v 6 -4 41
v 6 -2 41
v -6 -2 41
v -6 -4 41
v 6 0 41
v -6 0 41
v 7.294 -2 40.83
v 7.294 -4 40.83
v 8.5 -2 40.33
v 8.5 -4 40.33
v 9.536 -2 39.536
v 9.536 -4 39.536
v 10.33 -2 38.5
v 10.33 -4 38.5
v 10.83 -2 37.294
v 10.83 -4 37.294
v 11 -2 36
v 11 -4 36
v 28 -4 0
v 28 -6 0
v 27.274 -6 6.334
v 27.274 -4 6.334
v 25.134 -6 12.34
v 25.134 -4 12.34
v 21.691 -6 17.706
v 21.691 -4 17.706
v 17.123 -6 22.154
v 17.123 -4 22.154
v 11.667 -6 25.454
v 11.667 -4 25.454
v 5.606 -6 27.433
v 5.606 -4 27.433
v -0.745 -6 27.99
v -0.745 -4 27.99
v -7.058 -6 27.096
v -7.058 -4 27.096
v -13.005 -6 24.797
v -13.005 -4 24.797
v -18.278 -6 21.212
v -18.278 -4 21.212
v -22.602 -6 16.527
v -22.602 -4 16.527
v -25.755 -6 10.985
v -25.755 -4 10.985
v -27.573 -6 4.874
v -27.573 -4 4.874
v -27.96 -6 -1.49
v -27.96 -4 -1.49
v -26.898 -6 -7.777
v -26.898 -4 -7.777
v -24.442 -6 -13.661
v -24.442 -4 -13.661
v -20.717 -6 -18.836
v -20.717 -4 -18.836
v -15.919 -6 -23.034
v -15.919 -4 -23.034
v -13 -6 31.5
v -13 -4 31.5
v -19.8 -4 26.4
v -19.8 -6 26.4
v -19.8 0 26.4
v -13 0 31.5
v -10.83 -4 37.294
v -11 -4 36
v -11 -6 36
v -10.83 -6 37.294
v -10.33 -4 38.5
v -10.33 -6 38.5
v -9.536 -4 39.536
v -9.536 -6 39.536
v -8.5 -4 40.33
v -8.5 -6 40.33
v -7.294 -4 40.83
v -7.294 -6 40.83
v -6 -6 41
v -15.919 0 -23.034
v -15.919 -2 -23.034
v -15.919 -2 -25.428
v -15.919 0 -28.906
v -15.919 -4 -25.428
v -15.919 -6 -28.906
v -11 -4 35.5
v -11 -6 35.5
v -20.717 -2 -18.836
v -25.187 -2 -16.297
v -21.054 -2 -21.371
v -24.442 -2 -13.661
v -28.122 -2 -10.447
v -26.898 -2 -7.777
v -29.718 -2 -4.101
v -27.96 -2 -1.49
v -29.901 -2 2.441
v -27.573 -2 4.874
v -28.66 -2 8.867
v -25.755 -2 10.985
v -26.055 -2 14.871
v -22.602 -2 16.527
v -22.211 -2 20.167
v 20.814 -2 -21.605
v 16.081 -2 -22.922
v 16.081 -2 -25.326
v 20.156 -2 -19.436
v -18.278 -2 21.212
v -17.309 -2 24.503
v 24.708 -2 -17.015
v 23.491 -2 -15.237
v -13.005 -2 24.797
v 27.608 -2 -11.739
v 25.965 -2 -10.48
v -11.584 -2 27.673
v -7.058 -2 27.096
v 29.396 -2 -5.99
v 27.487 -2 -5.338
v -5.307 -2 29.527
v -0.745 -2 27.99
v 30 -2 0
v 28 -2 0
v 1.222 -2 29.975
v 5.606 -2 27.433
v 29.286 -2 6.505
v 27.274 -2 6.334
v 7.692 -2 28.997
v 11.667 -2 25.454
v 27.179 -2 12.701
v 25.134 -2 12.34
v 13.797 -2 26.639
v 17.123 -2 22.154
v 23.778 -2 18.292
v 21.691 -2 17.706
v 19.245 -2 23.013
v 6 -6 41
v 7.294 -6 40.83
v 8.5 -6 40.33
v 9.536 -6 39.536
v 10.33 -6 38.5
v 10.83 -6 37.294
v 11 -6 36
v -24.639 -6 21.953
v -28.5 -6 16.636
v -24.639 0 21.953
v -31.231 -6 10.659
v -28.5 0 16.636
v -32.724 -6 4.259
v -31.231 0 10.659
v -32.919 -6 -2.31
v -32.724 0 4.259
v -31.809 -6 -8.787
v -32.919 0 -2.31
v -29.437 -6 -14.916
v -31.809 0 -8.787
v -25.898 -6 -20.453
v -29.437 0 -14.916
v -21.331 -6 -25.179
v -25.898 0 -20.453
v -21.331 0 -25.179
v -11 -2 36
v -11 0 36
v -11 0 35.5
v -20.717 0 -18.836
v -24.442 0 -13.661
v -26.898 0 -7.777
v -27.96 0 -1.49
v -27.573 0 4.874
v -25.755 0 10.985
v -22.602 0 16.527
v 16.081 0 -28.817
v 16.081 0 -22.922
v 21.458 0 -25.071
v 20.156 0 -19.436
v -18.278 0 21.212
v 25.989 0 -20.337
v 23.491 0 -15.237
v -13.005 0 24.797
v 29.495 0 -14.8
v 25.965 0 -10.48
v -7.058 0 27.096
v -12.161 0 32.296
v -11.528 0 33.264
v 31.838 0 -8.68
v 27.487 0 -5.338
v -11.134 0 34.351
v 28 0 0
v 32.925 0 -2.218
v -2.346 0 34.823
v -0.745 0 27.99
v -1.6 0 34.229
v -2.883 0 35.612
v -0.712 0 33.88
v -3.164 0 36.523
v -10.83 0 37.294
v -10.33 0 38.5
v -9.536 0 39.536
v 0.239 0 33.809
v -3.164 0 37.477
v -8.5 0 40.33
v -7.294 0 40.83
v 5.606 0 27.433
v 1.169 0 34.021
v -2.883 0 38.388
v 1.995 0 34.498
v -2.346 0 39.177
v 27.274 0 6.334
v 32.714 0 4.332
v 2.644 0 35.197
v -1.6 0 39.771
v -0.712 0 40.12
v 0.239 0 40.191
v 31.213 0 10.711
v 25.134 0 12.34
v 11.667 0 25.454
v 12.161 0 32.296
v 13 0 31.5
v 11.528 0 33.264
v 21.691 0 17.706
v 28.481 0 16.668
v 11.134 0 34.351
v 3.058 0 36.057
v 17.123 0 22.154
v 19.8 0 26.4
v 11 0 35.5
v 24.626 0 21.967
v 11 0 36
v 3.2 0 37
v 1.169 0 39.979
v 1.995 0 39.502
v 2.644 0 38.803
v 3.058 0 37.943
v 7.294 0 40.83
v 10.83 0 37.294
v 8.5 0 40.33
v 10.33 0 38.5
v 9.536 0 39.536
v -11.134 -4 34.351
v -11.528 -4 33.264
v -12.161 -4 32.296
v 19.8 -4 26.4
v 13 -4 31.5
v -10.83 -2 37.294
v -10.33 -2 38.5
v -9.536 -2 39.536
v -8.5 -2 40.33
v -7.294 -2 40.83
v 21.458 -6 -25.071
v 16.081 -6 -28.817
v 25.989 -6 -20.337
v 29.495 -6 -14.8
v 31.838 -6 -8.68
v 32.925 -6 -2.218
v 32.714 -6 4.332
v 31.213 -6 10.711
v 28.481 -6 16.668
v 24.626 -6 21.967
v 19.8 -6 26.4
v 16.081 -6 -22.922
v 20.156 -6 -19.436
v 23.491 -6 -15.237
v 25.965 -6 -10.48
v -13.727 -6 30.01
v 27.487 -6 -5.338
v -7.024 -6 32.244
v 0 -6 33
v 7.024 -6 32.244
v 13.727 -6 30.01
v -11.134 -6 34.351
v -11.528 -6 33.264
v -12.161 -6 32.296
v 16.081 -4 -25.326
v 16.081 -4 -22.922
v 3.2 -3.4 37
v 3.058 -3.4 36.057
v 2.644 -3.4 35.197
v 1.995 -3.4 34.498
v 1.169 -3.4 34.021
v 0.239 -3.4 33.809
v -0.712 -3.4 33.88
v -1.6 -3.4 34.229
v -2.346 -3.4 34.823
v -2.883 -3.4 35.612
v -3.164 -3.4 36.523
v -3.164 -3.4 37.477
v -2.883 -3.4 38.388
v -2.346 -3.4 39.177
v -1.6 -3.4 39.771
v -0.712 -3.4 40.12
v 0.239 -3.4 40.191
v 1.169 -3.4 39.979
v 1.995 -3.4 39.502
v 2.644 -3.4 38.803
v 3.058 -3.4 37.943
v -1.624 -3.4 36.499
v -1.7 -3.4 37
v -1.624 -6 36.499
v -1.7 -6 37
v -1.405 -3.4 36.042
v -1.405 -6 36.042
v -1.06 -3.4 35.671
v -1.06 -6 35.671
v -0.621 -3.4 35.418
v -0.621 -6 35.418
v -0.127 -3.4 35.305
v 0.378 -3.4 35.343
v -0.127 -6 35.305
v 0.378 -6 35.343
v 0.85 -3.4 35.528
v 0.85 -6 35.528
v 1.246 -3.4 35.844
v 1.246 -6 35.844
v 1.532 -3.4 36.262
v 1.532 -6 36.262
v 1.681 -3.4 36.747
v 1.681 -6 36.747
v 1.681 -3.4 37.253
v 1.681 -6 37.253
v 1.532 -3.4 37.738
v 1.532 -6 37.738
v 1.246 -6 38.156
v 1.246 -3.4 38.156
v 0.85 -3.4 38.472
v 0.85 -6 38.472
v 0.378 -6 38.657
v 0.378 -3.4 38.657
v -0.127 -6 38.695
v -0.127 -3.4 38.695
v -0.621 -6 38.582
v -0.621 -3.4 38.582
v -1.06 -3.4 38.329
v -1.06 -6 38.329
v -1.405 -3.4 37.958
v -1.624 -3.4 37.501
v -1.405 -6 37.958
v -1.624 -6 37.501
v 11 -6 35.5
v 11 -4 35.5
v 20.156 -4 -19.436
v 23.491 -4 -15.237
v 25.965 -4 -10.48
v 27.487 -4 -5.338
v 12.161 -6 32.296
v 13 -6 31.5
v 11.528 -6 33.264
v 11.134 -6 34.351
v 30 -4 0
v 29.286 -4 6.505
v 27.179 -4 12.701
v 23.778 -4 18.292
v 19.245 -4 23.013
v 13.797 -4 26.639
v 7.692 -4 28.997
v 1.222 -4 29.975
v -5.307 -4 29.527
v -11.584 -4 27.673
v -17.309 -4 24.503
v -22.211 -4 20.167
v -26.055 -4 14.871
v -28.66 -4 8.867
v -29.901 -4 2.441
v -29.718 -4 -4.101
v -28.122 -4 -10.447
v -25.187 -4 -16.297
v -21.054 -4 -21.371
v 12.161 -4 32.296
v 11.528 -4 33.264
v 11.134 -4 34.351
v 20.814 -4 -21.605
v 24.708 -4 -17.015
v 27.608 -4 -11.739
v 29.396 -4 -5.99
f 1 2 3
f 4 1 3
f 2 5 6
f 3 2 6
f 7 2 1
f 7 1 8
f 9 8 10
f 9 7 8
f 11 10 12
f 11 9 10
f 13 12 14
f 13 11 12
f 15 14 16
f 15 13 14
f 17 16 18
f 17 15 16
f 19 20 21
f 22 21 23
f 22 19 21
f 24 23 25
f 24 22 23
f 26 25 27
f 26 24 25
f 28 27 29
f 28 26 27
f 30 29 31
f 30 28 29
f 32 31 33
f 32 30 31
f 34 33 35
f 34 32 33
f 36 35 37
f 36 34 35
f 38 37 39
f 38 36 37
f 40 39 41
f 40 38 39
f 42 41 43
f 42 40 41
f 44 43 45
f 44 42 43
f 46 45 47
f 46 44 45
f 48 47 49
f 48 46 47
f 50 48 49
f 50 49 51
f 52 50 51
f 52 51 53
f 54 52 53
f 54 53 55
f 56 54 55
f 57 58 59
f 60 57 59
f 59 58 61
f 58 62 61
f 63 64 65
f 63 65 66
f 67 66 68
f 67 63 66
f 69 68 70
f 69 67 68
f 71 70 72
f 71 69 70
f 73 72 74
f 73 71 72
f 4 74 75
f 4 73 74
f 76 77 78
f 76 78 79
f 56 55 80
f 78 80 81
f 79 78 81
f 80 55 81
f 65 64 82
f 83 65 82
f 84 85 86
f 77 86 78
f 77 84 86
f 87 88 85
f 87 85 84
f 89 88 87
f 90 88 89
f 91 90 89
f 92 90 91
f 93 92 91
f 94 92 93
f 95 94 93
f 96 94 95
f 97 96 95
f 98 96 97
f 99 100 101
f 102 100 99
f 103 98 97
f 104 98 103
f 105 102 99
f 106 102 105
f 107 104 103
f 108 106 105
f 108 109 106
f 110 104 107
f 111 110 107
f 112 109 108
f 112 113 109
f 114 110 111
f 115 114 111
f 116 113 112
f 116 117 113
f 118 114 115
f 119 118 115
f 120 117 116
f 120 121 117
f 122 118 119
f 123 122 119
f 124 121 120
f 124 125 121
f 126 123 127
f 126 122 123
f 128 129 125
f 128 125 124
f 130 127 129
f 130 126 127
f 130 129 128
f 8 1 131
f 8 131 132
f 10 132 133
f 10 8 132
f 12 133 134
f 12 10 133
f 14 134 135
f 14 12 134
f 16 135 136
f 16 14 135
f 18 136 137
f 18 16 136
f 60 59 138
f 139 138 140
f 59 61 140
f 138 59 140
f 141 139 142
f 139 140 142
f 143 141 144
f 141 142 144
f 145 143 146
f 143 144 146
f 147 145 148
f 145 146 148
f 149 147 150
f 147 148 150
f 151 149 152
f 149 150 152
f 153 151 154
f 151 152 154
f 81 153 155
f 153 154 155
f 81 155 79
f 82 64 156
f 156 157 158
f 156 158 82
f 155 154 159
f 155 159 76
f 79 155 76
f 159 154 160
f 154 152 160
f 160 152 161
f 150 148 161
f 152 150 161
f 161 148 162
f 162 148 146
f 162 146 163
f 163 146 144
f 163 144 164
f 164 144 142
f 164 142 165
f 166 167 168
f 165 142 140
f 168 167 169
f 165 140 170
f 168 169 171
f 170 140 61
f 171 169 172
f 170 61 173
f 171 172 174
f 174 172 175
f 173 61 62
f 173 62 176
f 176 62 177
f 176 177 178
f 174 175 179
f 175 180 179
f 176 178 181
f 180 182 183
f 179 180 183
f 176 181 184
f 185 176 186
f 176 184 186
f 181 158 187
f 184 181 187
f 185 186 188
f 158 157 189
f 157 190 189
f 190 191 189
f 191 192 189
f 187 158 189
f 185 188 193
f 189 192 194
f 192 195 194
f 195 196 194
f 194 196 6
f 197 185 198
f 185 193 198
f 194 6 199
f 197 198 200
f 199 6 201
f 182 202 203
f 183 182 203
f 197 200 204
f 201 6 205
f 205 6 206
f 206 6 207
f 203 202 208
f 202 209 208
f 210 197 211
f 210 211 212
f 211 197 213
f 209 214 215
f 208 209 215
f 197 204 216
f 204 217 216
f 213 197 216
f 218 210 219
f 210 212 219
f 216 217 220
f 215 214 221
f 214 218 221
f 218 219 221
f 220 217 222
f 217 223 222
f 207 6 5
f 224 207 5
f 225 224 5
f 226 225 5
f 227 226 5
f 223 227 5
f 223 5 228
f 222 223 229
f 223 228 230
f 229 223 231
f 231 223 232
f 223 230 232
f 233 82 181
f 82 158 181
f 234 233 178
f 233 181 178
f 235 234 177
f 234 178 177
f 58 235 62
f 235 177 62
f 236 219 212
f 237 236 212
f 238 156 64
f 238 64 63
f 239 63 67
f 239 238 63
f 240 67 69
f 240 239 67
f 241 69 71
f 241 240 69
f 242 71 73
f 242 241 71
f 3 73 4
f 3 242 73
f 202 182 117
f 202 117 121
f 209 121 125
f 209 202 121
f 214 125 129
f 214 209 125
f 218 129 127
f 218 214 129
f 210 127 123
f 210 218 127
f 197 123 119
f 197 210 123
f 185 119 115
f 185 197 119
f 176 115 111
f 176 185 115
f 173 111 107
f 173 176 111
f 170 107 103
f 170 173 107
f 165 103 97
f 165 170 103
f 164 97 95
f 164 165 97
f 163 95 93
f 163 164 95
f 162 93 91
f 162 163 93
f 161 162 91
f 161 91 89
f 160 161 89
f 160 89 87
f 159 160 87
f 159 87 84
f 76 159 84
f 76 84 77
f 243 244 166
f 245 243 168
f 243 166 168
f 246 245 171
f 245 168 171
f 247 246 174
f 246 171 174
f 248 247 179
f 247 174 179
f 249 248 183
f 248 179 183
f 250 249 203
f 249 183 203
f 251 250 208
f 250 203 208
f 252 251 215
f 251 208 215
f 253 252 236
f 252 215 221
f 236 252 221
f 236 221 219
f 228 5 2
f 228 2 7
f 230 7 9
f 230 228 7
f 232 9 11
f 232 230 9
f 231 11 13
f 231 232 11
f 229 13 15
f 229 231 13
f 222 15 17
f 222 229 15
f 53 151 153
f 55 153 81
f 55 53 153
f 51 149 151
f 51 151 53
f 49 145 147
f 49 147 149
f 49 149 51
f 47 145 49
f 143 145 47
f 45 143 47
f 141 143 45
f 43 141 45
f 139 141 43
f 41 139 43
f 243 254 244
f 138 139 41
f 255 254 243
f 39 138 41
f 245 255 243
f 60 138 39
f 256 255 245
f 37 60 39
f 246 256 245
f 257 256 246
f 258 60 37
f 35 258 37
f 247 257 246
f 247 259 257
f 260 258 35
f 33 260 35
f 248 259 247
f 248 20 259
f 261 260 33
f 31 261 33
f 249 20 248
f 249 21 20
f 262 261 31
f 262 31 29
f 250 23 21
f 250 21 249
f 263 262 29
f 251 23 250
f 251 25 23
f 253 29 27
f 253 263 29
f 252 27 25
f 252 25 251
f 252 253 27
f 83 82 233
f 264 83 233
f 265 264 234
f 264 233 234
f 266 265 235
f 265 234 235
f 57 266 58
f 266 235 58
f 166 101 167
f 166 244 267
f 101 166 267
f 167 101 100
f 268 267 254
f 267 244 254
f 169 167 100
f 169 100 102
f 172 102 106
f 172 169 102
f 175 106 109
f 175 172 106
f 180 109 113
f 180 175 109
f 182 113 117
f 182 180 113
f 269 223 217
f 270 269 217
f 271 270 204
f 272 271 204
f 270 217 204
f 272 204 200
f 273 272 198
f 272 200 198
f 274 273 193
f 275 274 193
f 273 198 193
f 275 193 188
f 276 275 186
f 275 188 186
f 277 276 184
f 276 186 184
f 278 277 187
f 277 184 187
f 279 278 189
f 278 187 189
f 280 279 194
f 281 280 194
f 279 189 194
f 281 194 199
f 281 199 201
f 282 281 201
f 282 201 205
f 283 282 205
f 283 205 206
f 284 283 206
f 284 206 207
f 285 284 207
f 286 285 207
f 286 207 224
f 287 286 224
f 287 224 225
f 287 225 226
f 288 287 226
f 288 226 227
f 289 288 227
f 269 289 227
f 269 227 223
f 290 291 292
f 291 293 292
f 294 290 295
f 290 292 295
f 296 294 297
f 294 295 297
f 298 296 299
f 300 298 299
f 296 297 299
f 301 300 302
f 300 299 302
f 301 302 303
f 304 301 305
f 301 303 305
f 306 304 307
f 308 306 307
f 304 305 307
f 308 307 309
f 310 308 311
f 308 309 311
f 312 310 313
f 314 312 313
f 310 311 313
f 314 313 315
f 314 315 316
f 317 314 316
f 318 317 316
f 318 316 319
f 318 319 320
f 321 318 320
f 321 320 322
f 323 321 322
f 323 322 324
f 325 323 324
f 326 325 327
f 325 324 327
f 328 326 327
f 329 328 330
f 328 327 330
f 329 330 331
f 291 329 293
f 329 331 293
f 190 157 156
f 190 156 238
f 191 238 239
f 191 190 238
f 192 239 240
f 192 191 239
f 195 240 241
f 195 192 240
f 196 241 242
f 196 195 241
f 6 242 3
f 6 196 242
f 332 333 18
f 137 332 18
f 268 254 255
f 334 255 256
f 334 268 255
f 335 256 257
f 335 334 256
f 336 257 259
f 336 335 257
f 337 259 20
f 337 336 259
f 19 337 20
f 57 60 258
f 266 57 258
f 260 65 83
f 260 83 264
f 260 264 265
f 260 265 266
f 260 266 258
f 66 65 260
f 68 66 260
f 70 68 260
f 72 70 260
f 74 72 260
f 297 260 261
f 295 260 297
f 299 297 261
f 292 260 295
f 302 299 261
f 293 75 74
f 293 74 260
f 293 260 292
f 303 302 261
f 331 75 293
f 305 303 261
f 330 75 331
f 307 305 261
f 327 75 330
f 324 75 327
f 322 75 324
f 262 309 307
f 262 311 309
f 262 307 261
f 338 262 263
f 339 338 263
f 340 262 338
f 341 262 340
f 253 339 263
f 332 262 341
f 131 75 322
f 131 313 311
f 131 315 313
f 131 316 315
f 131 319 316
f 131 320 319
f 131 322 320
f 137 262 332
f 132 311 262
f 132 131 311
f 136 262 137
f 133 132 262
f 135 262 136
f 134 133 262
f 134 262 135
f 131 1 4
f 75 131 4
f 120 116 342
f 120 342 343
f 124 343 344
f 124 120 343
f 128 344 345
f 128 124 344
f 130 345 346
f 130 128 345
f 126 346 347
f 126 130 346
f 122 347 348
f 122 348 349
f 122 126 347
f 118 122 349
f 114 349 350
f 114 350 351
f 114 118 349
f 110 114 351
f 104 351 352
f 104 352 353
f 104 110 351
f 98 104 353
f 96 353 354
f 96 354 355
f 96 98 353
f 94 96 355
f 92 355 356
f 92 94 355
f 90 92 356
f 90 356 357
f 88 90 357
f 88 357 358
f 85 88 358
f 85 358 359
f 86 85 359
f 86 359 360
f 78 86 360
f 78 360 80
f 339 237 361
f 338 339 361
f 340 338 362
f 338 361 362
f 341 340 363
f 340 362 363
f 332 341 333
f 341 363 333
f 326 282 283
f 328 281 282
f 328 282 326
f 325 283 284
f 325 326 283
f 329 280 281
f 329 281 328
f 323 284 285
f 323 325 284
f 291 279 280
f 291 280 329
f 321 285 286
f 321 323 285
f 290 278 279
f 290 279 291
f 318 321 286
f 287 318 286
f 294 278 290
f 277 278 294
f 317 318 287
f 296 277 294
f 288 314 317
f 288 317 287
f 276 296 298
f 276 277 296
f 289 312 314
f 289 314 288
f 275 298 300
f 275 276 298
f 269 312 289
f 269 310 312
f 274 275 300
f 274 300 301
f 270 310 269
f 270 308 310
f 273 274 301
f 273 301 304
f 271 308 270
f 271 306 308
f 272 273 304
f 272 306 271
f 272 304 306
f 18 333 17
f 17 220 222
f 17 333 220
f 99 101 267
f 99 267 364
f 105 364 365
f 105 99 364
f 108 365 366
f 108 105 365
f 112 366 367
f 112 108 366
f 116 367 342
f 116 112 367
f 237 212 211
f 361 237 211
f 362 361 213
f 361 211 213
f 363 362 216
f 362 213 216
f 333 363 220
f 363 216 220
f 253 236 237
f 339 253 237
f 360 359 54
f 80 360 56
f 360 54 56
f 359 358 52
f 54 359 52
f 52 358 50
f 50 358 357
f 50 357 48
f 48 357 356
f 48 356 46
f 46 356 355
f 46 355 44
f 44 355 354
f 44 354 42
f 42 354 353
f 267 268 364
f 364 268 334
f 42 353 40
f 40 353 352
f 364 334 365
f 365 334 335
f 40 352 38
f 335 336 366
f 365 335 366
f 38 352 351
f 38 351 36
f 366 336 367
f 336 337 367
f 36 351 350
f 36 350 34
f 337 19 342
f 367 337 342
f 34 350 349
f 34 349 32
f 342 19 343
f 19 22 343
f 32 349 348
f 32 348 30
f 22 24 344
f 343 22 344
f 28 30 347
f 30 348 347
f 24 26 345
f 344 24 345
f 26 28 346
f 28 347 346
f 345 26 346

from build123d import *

# Parameters (mm, degrees)
F0_R            = 28
F1_DEPTH        = 2
F2_R            = 30
F2_R_2          = 1.5
F3_DEPTH        = 2
F4_R            = 30
F4_R_2          = 28
F5_DEPTH        = 2
F6_DEPTH        = 2
F7_T1_DEPTH     = 14.5
F7_T3_DEPTH     = 2
F7_T5_DEPTH     = 14.5
F8_T1_DEPTH     = 14.5
F8_T3_DEPTH     = 2
F8_T5_DEPTH     = 14.5
F10_DEPTH       = 6
F11_D           = 3.4
F11_CBORE_D     = 6.4
F11_CBORE_DEPTH = 3.4


# Not quite as in the source:
# - a fillet or chamfer that OpenCascade refuses, or shapes differently, is made with other operations: its cross-section is extruded or revolved along the edge and cut away or added


with BuildPart() as f1:
    # F0 (on Front) → F1 (new body)
    with BuildSketch(Plane.XZ):
        with BuildLine():
            ThreePointArc((-19.8, 26.4), (-14.7580486515, -29.516097303), (33, 0))
            ThreePointArc((33, 0), (29.516097303, 14.7580486515), (19.8, 26.4))
            ThreePointArc((19.8, 26.4), (10.4355162786, 31.3065488357), (0, 33))
            ThreePointArc((0, 33), (-10.4355162786, 31.3065488357), (-19.8, 26.4))
        make_face()
        Circle(F0_R, mode=Mode.SUBTRACT)
        with BuildLine():
            Line((-13, 31.5), (-19.8, 26.4))
            ThreePointArc((-19.8, 26.4), (-10.4355162786, 31.3065488357), (0, 33))
            Line((0, 33), (0, 35.5))
            ThreePointArc((0, 35.5), (-1.5, 37), (0, 38.5))
            Line((0, 38.5), (0, 41))
            Line((0, 41), (-11, 41))
            Line((-11, 41), (-11, 35.5))
            ThreePointArc((-11, 35.5), (-11.527864045, 33.2639320225), (-13, 31.5))
        make_face()
        with BuildLine():
            ThreePointArc((0, 33), (10.4355162786, 31.3065488357), (19.8, 26.4))
            Line((19.8, 26.4), (13, 31.5))
            ThreePointArc((13, 31.5), (11.527864045, 33.2639320225), (11, 35.5))
            Line((11, 35.5), (11, 41))
            Line((11, 41), (0, 41))
            Line((0, 41), (0, 38.5))
            ThreePointArc((0, 38.5), (1.0606601718, 38.0606601718), (1.5, 37))
            ThreePointArc((1.5, 37), (1.0606601718, 35.9393398282), (0, 35.5))
            Line((0, 35.5), (0, 33))
        make_face()
    extrude(amount=F1_DEPTH)

    # F2 (on face) → F3 (join)
    with BuildSketch(Plane.XZ.offset(2)):
        with BuildLine():
            Line((11, 41), (-11, 41))
            Line((-11, 41), (-11, 35.5))
            ThreePointArc((-11, 35.5), (-11.527864045, 33.2639320225), (-13, 31.5))
            Line((-13, 31.5), (-19.8, 26.4))
            ThreePointArc((-19.8, 26.4), (0, -33), (19.8, 26.4))
            Line((19.8, 26.4), (13, 31.5))
            ThreePointArc((13, 31.5), (11.527864045, 33.2639320225), (11, 35.5))
            Line((11, 35.5), (11, 41))
        make_face()
        Circle(F2_R, mode=Mode.SUBTRACT)
        with Locations((0, 37)):
            Circle(F2_R_2, mode=Mode.SUBTRACT)
    extrude(amount=F3_DEPTH)

    # F4 (on face) → F5 (join)
    with BuildSketch(Plane.XZ.offset(4)):
        with BuildLine():
            ThreePointArc((-19.8, 26.4), (-14.7580486515, -29.516097303), (33, 0))
            ThreePointArc((33, 0), (29.516097303, 14.7580486515), (19.8, 26.4))
            ThreePointArc((19.8, 26.4), (0, 33), (-19.8, 26.4))
        make_face()
        Circle(F4_R, mode=Mode.SUBTRACT)
        Circle(F4_R)
        Circle(F4_R_2, mode=Mode.SUBTRACT)
    extrude(amount=F5_DEPTH)

    # F6 (add): a face of the model
    f6_faces = [f1.faces().sort_by_distance(p)[0] for p in [
        (10.5779431318, -4, 38.25),
    ]]
    extrude(f6_faces, amount=F6_DEPTH)

    # F7: fillet of radius 5 on 3 edges, made by hand

    # F7_s2 → F7_t1 (cut)
    with BuildSketch(Plane.XZ.offset(-12.5)):
        with BuildLine():
            ThreePointArc((-11, 36), (-9.5355339059, 39.5355339059), (-6, 41))
            Line((-6, 41), (-11, 41))
            Line((-11, 41), (-11, 36))
        make_face()
    extrude(amount=F7_T1_DEPTH, mode=Mode.SUBTRACT)

    # F7_s4 → F7_t3 (cut)
    with BuildSketch(Plane.XZ.offset(2)):
        with BuildLine():
            ThreePointArc((-11, 36), (-9.5355339059, 39.5355339059), (-6, 41))
            Line((-6, 41), (-11, 41))
            Line((-11, 41), (-11, 36))
        make_face()
    extrude(amount=F7_T3_DEPTH, mode=Mode.SUBTRACT)

    # F7_s6 → F7_t5 (cut)
    with BuildSketch(Plane.XZ.offset(4)):
        with BuildLine():
            ThreePointArc((-11, 36), (-9.5355339059, 39.5355339059), (-6, 41))
            Line((-6, 41), (-11, 41))
            Line((-11, 41), (-11, 36))
        make_face()
    extrude(amount=F7_T5_DEPTH, mode=Mode.SUBTRACT)

    # F8: fillet of radius 5 on 3 edges, made by hand

    # F8_s2 → F8_t1 (cut)
    with BuildSketch(Plane.XZ.offset(-12.5)):
        with BuildLine():
            ThreePointArc((6, 41), (9.5355339059, 39.5355339059), (11, 36))
            Line((11, 36), (11, 41))
            Line((11, 41), (6, 41))
        make_face()
    extrude(amount=F8_T1_DEPTH, mode=Mode.SUBTRACT)

    # F8_s4 → F8_t3 (cut)
    with BuildSketch(Plane.XZ.offset(2)):
        with BuildLine():
            ThreePointArc((6, 41), (9.5355339059, 39.5355339059), (11, 36))
            Line((11, 36), (11, 41))
            Line((11, 41), (6, 41))
        make_face()
    extrude(amount=F8_T3_DEPTH, mode=Mode.SUBTRACT)

    # F8_s6 → F8_t5 (cut)
    with BuildSketch(Plane.XZ.offset(4)):
        with BuildLine():
            ThreePointArc((6, 41), (9.5355339059, 39.5355339059), (11, 36))
            Line((11, 36), (11, 41))
            Line((11, 41), (6, 41))
        make_face()
    extrude(amount=F8_T5_DEPTH, mode=Mode.SUBTRACT)

    # F9 (on face) → F10 (cut)
    with BuildSketch(Plane.XZ.offset(6)):
        with BuildLine():
            ThreePointArc((16.0808527693, -22.9217402091), (0.0985229196, -27.9998266644), (-15.9191472307, -23.0343385285))
            Line((-15.9191472307, -23.0343385285), (-15.9191472307, -28.9064136732))
            ThreePointArc((-15.9191472307, -28.9064136732), (0.0924457314, -32.9998705117), (16.0808527693, -28.8167689759))
            Line((16.0808527693, -28.8167689759), (16.0808527693, -22.9217402091))
        make_face()
    extrude(amount=-F10_DEPTH, mode=Mode.SUBTRACT)

    # F11 (through all)
    with Locations(Plane(origin=(0, 0, 0), x_dir=(1, 0, 0), z_dir=(0, 1, 0))):
        with Locations((0, -37)):
            CounterBoreHole(F11_D / 2, F11_CBORE_D / 2, F11_CBORE_DEPTH)


solid = f1.part
